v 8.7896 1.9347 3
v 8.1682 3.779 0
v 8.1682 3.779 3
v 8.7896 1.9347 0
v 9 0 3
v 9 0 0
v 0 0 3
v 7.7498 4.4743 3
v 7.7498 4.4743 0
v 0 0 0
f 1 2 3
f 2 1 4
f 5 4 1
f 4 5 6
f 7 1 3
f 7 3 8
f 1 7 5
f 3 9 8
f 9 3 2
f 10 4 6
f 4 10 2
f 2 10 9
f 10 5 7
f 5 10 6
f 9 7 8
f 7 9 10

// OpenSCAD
toleranta=1;//toleranta la desenare

//______________cu diferenta
module felie_pizza_diference(diametru,grosime,unghi_felie)
{
    
    difference(){
    cylinder(h=grosime,r=diametru/2);
   translate([-diametru/2-toleranta,-diametru/2-toleranta,-toleranta]) cube([diametru+2*toleranta, diametru/2+toleranta,grosime+2*toleranta]);       
  rotate([0,0,30]) translate([-diametru/2-toleranta,0,-toleranta]) cube([diametru+2*toleranta, diametru/2+toleranta,grosime+2*toleranta]);   
    }
}    
//end______________cu diferenta   
module felie_pizza_intersection(diametru,grosime,unghi_felie)
{
    
    intersection(){
        cylinder(h=grosime,r=diametru/2);
        translate([-diametru/2-toleranta,0,-toleranta]) cube([diametru+2*toleranta, diametru/2+toleranta,grosime+2*toleranta]);  
     rotate([0,0,-(90-unghi_felie)]) cube([diametru/2+toleranta, diametru/2+toleranta,grosime+2*toleranta]);      
        
        }
}  
//felie_pizza_diference(diametru=30,grosime=3,unghi_felie=30);
 felie_pizza_intersection(diametru=18,grosime=3,unghi_felie=30); 
